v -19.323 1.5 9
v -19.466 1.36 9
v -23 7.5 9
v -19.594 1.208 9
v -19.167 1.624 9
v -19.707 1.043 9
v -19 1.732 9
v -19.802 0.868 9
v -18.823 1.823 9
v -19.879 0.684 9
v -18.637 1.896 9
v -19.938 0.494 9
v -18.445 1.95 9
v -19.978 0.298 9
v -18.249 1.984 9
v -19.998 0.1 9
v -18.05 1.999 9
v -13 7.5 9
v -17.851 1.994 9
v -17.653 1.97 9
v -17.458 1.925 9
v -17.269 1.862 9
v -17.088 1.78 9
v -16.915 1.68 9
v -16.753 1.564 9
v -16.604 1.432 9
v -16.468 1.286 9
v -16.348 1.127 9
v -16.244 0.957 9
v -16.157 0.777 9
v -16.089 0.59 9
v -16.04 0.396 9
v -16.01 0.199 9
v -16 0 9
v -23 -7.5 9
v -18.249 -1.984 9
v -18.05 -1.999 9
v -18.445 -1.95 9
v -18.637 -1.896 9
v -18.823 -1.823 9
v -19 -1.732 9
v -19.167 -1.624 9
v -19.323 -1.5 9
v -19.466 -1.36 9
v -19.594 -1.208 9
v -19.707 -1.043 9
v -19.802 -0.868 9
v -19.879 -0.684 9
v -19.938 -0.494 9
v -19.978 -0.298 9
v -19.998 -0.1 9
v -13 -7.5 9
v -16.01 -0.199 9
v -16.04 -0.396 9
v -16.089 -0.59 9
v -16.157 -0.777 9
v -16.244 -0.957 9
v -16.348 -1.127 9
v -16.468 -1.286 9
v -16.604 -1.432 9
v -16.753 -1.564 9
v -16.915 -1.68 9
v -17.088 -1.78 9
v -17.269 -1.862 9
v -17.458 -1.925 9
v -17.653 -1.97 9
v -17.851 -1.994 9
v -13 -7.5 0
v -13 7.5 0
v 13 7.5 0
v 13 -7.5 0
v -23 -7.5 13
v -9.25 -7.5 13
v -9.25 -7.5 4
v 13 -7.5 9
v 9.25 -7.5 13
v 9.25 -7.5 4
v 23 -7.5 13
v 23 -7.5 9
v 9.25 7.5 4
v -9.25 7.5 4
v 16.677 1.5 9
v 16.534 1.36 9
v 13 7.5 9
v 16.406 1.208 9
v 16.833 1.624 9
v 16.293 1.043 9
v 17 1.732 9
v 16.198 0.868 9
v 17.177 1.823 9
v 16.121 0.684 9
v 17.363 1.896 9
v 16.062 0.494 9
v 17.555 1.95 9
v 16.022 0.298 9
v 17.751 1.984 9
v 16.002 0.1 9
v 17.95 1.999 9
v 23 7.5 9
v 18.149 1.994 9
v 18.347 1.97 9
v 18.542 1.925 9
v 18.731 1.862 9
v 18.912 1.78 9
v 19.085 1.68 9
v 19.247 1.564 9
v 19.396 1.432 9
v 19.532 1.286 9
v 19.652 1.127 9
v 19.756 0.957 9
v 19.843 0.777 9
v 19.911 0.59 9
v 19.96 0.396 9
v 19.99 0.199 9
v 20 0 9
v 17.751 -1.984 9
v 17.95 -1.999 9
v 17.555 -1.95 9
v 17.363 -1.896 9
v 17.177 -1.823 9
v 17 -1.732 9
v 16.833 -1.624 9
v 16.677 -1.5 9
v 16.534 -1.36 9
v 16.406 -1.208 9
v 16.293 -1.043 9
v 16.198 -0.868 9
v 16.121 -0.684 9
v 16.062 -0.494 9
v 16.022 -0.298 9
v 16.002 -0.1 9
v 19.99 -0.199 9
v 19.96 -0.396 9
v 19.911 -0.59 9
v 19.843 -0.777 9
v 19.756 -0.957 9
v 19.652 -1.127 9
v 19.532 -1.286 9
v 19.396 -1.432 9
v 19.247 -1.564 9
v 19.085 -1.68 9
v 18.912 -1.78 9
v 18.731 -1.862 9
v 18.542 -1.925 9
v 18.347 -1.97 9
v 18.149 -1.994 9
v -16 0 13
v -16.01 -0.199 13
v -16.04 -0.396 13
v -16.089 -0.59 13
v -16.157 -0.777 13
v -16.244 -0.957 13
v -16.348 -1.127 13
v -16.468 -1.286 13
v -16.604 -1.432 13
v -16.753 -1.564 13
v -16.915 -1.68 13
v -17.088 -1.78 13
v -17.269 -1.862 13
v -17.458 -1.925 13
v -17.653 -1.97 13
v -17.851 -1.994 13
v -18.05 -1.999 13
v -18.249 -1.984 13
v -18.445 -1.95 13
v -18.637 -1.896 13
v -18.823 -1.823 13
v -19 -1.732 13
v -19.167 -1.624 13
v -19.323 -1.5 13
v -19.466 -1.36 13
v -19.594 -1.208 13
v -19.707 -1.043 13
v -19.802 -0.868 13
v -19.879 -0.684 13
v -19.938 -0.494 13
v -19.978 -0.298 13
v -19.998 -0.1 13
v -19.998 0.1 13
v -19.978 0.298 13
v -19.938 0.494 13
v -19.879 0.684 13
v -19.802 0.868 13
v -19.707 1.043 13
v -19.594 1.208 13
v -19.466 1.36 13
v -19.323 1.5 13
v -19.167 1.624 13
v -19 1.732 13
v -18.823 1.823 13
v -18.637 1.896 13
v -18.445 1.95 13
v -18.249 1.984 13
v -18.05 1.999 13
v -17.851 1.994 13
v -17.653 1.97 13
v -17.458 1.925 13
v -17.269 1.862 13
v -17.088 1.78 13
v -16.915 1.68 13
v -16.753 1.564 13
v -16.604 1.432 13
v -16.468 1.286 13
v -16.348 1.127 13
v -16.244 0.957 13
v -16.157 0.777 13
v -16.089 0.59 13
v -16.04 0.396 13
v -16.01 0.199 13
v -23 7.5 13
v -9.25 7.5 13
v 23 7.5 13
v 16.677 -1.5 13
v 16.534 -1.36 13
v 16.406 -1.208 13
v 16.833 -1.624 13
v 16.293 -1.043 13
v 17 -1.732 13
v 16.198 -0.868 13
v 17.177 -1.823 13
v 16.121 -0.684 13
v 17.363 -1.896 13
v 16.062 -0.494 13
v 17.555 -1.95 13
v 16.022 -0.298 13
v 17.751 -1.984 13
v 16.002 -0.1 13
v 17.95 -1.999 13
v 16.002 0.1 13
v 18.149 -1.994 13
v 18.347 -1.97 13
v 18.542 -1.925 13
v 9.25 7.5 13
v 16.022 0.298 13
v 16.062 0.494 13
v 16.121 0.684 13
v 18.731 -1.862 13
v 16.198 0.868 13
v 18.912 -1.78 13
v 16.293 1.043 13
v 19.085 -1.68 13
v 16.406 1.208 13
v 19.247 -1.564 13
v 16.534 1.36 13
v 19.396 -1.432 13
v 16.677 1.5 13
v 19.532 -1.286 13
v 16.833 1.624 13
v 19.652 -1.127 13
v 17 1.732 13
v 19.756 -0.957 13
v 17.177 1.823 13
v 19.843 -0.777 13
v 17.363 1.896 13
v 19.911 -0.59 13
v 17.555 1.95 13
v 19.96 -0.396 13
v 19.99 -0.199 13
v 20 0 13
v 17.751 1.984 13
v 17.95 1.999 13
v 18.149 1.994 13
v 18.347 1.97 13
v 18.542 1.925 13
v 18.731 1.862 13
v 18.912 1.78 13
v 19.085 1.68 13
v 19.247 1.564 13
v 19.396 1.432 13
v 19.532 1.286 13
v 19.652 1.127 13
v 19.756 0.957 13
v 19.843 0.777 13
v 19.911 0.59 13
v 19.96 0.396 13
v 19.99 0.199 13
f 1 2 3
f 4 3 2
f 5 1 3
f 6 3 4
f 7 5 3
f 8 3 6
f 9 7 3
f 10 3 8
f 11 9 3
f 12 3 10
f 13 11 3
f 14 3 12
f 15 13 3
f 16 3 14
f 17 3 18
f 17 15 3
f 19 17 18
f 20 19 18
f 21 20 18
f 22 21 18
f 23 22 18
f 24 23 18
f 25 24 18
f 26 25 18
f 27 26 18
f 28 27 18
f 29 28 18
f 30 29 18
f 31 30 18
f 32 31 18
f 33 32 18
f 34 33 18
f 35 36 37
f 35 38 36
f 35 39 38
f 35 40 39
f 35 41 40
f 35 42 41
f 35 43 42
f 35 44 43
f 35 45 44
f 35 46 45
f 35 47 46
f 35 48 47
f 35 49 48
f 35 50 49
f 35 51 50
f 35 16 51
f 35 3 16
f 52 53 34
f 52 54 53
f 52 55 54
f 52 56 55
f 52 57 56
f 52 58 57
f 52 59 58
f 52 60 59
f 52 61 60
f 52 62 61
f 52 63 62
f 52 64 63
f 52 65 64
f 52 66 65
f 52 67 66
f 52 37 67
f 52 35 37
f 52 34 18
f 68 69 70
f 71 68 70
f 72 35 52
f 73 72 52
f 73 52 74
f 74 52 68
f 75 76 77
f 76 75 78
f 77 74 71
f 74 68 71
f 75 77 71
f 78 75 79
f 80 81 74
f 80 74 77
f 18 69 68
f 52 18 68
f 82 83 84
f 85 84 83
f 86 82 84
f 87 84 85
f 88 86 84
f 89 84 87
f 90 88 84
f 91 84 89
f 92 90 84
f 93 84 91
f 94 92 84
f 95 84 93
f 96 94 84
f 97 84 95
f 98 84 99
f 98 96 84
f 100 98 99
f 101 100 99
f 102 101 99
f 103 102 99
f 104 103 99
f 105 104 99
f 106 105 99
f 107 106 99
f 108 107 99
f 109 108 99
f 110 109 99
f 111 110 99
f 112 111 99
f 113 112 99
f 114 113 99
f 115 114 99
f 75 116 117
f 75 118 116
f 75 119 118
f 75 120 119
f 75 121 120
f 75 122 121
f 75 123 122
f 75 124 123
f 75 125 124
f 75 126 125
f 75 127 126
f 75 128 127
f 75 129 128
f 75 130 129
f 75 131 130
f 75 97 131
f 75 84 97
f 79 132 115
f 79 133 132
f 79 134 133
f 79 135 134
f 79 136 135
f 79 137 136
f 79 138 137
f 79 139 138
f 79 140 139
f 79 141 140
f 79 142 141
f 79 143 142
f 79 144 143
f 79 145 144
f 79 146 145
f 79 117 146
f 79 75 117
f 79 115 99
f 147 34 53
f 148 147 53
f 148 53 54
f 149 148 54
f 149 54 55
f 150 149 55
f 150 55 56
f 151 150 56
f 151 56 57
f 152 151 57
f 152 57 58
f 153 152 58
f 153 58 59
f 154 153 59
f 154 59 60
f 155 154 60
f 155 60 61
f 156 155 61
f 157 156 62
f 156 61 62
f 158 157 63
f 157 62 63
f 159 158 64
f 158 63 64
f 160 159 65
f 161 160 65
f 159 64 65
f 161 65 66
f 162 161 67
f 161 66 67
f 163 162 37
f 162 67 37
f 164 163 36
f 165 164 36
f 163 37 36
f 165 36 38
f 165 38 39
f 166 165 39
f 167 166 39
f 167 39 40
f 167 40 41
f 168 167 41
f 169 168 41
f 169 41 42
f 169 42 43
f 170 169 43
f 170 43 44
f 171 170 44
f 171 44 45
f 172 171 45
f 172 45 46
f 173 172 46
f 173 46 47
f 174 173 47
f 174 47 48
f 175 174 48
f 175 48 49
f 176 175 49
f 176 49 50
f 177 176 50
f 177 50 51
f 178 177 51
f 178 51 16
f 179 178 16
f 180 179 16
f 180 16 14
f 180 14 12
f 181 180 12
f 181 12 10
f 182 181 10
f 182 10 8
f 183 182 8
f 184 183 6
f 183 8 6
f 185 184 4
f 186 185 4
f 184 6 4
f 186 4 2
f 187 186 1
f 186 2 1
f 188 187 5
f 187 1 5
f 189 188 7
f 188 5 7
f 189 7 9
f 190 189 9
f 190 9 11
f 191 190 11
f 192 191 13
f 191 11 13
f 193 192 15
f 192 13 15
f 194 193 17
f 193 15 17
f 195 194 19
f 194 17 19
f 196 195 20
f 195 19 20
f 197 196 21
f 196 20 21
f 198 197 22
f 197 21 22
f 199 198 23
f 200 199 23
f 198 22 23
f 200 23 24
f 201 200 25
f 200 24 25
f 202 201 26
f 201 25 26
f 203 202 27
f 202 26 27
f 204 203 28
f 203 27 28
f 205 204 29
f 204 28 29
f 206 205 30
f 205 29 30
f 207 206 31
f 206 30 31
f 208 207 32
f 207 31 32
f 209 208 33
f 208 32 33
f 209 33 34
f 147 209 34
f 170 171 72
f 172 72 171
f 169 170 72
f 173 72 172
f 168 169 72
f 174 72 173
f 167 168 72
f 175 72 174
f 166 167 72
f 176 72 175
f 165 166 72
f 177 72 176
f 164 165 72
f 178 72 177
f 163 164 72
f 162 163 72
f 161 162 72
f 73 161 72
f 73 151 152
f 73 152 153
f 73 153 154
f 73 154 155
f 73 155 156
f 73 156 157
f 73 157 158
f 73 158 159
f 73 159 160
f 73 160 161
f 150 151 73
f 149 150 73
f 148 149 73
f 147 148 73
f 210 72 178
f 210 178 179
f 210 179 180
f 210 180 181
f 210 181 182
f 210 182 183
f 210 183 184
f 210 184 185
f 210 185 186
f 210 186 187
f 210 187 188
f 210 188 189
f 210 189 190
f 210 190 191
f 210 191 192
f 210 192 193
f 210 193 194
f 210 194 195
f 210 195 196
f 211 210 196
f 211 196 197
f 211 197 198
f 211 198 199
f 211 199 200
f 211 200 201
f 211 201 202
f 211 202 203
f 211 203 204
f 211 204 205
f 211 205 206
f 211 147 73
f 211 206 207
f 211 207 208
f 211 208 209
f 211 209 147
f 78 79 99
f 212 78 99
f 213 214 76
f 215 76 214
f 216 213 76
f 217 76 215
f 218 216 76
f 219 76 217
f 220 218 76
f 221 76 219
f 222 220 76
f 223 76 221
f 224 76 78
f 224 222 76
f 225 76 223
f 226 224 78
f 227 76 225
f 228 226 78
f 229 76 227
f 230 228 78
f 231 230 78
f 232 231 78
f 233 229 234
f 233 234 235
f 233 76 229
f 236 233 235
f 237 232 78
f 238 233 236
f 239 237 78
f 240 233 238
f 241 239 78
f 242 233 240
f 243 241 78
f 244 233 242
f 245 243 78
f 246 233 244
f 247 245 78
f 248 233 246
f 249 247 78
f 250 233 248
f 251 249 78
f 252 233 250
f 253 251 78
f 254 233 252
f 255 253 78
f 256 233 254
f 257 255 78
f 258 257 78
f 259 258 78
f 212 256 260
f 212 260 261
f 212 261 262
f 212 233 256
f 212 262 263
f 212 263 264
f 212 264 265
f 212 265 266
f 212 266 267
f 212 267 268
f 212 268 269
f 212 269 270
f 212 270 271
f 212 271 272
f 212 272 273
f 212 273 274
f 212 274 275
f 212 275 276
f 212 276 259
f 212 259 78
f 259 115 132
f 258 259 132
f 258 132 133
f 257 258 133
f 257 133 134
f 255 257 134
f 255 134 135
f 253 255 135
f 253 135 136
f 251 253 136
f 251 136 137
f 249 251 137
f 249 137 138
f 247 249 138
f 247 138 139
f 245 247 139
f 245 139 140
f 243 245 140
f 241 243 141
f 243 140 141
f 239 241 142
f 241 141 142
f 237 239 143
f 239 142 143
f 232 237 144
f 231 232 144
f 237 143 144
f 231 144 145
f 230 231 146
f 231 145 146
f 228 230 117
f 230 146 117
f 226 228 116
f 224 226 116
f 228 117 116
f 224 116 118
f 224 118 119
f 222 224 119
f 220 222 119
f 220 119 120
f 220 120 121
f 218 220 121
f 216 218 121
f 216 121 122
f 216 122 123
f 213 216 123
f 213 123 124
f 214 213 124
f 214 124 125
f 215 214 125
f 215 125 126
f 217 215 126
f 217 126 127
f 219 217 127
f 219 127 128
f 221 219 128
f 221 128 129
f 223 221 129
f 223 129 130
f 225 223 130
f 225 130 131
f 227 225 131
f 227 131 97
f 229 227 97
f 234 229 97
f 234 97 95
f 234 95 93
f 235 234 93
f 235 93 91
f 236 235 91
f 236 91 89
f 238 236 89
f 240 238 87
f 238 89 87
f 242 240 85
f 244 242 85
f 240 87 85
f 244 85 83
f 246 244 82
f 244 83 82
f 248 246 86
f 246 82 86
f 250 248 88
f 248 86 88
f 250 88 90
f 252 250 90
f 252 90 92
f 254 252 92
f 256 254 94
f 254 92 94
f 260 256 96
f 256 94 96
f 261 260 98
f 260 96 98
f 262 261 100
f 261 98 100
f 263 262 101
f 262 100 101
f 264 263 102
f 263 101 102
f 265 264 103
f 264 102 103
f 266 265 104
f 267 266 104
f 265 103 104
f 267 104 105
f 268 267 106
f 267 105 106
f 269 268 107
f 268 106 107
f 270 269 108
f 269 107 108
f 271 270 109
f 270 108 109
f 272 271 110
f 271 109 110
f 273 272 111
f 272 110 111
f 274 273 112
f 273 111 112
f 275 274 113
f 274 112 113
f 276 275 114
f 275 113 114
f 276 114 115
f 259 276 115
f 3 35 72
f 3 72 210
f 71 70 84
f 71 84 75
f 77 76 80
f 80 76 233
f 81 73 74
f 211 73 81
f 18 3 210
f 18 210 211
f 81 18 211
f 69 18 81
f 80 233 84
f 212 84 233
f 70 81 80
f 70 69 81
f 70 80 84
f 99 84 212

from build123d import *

# Parameters (mm, degrees)
F0_W     = 46
F0_H     = 15
F1_DEPTH = 13
F2_W     = 18.5
F2_H     = 15
F3_DEPTH = 9
F4_W     = 10
F4_H     = 15
F5_DEPTH = 9
F6_R     = 2
F7_DEPTH = 25


with BuildPart() as f1:
    # F0 (on Top) → F1 (new body)
    with BuildSketch(Plane.XY):
        Rectangle(F0_W, F0_H)
    extrude(amount=F1_DEPTH)

    # F2 (on face) → F3 (cut)
    with BuildSketch(Plane.XY.offset(13)):
        Rectangle(F2_W, F2_H)
    extrude(amount=-F3_DEPTH, mode=Mode.SUBTRACT)

    # F4 (on face) → F5 (cut)
    with BuildSketch(Plane(origin=(0, 0, 0), x_dir=(1, 0, 0), z_dir=(0, 0, -1))):
        with Locations((-18, 0)):
            Rectangle(F4_W, F4_H)
        with Locations((18, 0)):
            Rectangle(F4_W, F4_H)
    extrude(amount=-F5_DEPTH, mode=Mode.SUBTRACT)

    # F6 (on face) → F7 (cut)
    with BuildSketch(Plane(origin=(0, 0, 9), x_dir=(1, 0, 0), z_dir=(0, 0, -1))):
        with Locations((-18, 0)):
            Circle(F6_R)
        with Locations((18, 0)):
            Circle(F6_R)
    extrude(amount=-F7_DEPTH, mode=Mode.SUBTRACT)


solid = f1.part
